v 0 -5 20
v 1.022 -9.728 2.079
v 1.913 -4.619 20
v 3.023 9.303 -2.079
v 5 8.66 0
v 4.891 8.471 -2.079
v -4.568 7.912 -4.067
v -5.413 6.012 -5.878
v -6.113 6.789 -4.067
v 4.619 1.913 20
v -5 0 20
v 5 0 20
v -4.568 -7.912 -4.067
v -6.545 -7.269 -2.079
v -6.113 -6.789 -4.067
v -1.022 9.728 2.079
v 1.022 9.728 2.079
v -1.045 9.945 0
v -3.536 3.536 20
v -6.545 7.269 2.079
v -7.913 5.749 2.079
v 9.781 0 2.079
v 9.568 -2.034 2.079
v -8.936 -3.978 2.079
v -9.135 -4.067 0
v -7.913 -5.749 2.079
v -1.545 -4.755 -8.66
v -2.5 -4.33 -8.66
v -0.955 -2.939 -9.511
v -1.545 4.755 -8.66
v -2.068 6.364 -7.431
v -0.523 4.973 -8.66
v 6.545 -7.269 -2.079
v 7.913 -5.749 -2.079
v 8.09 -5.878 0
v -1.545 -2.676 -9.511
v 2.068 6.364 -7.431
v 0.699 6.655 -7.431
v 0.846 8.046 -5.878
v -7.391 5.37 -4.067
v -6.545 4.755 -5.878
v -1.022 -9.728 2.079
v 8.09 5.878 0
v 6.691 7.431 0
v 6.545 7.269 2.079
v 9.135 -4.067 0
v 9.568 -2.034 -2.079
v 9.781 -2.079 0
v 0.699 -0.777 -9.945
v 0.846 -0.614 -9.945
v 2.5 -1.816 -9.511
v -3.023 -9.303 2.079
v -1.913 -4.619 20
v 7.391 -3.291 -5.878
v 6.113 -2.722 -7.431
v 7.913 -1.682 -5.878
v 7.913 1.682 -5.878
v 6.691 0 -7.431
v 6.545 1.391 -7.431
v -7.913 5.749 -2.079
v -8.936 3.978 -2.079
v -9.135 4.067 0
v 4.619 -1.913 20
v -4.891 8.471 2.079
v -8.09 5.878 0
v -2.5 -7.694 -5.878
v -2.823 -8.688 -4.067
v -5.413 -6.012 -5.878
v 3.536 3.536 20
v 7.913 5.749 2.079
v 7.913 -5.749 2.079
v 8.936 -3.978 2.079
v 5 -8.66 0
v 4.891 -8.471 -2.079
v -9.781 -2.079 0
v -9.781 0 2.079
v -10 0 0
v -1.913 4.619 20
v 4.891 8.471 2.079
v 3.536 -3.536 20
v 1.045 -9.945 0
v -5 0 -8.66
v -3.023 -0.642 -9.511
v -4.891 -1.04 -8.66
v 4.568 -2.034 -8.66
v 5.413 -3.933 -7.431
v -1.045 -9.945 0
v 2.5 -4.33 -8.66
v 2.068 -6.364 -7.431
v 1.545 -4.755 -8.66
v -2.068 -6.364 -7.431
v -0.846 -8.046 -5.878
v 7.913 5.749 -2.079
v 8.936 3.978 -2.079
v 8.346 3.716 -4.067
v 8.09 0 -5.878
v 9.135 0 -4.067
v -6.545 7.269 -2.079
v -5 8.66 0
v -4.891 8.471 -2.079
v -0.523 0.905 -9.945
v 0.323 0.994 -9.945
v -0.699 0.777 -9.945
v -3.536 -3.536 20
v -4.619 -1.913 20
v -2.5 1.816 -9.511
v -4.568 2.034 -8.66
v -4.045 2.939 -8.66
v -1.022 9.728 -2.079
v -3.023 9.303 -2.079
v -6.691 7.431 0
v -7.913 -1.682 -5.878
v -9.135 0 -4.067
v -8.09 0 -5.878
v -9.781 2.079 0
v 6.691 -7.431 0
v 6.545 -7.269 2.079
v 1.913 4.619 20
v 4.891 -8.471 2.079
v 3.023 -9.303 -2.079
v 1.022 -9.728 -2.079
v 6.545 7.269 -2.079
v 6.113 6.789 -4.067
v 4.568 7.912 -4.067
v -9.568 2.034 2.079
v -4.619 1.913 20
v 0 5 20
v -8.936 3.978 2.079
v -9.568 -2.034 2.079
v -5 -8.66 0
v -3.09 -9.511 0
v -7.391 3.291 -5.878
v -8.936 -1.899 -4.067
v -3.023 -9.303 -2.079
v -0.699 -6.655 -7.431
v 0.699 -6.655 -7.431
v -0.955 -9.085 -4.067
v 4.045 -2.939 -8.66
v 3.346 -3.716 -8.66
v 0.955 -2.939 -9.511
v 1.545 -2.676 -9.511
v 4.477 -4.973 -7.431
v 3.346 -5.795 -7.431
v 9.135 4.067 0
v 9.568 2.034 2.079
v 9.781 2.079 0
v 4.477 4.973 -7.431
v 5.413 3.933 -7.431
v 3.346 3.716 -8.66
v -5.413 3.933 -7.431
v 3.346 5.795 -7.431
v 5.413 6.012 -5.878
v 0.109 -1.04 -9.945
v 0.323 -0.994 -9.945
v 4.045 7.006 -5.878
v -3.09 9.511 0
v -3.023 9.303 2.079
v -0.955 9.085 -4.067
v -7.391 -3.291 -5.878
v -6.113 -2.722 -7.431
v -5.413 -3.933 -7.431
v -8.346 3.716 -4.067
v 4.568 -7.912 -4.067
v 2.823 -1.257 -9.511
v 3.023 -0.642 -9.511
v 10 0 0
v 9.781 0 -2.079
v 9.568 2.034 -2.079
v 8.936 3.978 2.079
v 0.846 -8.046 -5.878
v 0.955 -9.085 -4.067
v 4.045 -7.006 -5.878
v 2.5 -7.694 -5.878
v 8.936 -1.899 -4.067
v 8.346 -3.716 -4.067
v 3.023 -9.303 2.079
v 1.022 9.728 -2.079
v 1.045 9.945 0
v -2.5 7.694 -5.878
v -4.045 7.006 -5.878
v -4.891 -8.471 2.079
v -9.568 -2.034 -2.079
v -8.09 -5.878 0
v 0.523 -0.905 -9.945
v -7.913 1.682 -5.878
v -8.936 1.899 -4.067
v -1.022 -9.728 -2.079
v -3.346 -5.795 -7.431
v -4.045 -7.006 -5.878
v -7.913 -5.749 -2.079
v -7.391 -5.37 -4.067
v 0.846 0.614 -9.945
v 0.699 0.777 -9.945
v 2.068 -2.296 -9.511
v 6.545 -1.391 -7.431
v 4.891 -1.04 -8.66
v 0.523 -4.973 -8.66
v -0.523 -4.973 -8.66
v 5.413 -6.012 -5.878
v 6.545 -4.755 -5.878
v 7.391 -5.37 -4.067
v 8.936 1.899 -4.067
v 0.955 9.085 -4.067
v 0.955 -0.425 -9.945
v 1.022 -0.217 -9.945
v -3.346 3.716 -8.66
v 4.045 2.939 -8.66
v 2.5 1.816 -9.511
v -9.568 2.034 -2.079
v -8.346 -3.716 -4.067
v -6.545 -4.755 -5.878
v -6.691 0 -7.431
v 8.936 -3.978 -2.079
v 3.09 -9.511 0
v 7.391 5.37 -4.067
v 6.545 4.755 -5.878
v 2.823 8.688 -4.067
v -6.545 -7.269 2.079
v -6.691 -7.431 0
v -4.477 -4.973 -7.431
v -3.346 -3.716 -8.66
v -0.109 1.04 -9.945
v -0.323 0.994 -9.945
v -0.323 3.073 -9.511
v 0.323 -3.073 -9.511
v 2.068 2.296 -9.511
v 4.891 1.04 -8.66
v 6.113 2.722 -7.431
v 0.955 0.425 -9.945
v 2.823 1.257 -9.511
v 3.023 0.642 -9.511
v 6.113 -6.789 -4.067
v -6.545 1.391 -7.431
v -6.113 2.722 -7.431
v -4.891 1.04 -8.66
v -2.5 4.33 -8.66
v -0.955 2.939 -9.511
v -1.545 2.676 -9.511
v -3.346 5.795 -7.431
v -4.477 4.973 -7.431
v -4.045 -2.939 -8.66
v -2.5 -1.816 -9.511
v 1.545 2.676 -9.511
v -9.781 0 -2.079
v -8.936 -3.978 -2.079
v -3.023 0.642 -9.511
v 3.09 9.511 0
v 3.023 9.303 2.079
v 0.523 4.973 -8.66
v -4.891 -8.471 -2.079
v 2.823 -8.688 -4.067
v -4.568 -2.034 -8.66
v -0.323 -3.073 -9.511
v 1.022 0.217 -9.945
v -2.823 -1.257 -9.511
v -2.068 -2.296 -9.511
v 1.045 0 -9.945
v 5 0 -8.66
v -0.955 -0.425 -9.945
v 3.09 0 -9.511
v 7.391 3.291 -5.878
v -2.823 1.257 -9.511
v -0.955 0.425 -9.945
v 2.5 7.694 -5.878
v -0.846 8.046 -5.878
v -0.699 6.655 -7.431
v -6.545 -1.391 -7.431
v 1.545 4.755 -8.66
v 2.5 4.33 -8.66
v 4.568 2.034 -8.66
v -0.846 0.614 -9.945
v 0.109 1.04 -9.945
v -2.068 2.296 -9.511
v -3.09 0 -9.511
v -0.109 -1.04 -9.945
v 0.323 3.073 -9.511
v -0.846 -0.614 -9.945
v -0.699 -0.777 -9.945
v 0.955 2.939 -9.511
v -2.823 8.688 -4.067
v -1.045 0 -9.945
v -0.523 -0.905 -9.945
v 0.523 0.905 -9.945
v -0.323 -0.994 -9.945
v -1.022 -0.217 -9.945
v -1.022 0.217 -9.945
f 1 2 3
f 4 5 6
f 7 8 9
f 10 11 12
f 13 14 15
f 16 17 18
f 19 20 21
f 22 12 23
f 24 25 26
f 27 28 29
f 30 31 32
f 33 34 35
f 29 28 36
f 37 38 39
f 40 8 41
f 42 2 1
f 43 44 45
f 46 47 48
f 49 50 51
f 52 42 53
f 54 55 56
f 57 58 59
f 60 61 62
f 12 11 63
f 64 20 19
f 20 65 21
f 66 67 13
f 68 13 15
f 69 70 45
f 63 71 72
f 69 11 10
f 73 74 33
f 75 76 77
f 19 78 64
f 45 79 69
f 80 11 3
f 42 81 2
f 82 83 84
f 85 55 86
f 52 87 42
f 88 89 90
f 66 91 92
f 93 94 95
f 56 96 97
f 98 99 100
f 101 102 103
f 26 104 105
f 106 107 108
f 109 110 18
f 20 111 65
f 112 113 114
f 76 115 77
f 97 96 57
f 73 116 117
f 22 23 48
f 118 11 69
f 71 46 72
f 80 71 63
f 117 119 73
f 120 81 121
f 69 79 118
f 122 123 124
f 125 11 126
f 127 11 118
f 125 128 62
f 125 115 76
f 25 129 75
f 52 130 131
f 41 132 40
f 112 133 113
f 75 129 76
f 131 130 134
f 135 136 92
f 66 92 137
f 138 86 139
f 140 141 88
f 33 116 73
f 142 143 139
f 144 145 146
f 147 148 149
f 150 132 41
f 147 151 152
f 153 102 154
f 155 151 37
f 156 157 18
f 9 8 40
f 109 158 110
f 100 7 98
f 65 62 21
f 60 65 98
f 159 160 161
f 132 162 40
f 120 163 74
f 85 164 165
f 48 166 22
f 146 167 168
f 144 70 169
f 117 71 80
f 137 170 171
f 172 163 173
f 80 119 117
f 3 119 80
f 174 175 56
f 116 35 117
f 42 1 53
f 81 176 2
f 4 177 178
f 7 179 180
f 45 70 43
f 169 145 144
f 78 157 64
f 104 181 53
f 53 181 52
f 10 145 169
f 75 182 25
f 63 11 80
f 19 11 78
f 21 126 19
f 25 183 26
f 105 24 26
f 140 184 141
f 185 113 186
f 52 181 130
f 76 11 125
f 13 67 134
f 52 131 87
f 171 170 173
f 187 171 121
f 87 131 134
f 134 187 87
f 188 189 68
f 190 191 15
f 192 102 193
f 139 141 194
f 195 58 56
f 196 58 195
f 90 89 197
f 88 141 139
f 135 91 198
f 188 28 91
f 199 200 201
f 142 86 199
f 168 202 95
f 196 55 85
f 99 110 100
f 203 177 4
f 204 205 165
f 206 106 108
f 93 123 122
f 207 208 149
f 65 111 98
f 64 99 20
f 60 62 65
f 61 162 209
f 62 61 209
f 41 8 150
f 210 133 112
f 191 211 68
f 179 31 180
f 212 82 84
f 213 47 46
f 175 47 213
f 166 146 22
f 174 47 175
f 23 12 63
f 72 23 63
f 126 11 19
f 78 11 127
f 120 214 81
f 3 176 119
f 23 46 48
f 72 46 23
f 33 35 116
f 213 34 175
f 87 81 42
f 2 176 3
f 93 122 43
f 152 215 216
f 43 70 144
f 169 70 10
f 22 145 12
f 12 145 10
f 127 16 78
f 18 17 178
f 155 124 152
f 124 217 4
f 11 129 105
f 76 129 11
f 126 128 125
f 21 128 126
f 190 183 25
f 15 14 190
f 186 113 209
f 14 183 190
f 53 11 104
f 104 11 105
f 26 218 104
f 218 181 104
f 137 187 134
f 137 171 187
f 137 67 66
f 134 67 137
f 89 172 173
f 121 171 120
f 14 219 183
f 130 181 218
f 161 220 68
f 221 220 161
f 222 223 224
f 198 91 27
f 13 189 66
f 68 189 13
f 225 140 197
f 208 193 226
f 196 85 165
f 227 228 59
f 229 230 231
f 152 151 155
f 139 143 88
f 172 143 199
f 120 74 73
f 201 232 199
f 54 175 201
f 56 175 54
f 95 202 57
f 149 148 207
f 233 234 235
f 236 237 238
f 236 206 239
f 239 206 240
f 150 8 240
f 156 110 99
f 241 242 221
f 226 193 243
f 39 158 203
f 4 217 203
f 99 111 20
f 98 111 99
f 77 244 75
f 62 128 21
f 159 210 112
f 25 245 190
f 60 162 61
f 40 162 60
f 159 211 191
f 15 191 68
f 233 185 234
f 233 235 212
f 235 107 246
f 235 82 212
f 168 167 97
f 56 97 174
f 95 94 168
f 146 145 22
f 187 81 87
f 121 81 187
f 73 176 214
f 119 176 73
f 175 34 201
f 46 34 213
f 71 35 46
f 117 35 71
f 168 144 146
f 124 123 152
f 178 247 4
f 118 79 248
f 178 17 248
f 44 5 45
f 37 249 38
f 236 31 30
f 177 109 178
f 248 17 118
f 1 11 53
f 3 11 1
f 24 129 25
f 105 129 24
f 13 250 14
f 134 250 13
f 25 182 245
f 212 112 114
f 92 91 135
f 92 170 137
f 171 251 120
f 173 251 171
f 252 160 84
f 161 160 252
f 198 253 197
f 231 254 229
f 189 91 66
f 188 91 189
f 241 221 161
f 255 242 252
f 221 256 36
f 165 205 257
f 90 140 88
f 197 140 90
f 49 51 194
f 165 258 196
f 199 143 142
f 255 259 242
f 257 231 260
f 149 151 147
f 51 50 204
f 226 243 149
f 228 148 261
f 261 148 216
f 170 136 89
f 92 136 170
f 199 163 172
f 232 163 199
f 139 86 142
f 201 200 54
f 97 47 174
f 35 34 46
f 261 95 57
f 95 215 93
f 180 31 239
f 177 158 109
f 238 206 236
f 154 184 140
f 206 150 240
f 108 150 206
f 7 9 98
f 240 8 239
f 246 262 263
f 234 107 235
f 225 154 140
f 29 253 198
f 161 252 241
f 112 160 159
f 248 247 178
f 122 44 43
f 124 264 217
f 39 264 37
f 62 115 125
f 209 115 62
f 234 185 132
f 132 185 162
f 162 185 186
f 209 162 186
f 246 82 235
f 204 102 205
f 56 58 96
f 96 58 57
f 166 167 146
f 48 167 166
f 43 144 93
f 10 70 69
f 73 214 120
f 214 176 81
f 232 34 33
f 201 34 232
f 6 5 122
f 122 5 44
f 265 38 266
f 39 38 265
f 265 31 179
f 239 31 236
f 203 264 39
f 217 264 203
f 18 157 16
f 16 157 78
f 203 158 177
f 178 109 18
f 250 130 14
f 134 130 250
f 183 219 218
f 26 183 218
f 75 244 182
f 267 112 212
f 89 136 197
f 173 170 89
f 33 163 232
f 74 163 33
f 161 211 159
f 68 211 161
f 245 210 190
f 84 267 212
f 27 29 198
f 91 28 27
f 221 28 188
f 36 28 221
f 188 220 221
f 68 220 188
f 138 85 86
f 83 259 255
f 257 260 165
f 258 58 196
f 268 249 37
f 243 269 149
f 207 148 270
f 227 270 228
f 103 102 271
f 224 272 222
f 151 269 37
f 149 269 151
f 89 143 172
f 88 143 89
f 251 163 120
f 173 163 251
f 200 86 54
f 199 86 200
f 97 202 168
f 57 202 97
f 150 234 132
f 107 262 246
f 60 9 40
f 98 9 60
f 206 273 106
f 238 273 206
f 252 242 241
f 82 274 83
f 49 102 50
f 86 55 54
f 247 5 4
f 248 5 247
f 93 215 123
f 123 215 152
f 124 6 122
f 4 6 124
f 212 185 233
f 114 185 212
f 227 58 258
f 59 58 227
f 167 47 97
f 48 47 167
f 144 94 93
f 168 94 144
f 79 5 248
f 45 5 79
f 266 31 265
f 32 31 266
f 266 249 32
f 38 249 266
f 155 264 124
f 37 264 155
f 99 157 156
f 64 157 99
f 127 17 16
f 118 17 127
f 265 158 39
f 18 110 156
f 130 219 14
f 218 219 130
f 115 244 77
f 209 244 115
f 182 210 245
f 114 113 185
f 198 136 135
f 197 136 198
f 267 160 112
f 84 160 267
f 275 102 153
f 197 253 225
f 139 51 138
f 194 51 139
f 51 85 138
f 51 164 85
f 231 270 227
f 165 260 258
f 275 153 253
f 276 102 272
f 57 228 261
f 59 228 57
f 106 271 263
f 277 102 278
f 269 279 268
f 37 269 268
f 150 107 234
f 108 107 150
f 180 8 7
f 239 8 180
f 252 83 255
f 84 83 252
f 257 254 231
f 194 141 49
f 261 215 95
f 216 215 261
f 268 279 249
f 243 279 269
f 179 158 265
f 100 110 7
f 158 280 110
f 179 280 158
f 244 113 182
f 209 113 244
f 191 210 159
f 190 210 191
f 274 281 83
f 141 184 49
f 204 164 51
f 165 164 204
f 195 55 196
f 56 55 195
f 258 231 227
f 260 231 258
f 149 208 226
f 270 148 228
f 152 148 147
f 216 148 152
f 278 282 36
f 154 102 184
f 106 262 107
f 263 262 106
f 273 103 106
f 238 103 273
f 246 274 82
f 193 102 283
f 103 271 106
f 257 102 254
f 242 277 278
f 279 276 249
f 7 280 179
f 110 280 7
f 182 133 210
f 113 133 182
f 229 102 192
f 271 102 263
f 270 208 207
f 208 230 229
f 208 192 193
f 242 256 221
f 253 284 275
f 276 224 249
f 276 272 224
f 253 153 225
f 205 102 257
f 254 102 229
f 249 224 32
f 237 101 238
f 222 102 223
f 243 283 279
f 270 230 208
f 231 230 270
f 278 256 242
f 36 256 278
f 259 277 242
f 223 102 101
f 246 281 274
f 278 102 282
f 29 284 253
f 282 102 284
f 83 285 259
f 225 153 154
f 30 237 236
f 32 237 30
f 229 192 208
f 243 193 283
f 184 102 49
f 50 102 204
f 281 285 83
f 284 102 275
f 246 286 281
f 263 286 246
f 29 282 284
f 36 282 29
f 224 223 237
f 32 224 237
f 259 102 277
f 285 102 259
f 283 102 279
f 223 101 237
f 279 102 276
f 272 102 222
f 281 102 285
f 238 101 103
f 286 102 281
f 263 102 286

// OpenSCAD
  hull(){
      sphere(10);
      cylinder(h=20, r=5); 
  }
